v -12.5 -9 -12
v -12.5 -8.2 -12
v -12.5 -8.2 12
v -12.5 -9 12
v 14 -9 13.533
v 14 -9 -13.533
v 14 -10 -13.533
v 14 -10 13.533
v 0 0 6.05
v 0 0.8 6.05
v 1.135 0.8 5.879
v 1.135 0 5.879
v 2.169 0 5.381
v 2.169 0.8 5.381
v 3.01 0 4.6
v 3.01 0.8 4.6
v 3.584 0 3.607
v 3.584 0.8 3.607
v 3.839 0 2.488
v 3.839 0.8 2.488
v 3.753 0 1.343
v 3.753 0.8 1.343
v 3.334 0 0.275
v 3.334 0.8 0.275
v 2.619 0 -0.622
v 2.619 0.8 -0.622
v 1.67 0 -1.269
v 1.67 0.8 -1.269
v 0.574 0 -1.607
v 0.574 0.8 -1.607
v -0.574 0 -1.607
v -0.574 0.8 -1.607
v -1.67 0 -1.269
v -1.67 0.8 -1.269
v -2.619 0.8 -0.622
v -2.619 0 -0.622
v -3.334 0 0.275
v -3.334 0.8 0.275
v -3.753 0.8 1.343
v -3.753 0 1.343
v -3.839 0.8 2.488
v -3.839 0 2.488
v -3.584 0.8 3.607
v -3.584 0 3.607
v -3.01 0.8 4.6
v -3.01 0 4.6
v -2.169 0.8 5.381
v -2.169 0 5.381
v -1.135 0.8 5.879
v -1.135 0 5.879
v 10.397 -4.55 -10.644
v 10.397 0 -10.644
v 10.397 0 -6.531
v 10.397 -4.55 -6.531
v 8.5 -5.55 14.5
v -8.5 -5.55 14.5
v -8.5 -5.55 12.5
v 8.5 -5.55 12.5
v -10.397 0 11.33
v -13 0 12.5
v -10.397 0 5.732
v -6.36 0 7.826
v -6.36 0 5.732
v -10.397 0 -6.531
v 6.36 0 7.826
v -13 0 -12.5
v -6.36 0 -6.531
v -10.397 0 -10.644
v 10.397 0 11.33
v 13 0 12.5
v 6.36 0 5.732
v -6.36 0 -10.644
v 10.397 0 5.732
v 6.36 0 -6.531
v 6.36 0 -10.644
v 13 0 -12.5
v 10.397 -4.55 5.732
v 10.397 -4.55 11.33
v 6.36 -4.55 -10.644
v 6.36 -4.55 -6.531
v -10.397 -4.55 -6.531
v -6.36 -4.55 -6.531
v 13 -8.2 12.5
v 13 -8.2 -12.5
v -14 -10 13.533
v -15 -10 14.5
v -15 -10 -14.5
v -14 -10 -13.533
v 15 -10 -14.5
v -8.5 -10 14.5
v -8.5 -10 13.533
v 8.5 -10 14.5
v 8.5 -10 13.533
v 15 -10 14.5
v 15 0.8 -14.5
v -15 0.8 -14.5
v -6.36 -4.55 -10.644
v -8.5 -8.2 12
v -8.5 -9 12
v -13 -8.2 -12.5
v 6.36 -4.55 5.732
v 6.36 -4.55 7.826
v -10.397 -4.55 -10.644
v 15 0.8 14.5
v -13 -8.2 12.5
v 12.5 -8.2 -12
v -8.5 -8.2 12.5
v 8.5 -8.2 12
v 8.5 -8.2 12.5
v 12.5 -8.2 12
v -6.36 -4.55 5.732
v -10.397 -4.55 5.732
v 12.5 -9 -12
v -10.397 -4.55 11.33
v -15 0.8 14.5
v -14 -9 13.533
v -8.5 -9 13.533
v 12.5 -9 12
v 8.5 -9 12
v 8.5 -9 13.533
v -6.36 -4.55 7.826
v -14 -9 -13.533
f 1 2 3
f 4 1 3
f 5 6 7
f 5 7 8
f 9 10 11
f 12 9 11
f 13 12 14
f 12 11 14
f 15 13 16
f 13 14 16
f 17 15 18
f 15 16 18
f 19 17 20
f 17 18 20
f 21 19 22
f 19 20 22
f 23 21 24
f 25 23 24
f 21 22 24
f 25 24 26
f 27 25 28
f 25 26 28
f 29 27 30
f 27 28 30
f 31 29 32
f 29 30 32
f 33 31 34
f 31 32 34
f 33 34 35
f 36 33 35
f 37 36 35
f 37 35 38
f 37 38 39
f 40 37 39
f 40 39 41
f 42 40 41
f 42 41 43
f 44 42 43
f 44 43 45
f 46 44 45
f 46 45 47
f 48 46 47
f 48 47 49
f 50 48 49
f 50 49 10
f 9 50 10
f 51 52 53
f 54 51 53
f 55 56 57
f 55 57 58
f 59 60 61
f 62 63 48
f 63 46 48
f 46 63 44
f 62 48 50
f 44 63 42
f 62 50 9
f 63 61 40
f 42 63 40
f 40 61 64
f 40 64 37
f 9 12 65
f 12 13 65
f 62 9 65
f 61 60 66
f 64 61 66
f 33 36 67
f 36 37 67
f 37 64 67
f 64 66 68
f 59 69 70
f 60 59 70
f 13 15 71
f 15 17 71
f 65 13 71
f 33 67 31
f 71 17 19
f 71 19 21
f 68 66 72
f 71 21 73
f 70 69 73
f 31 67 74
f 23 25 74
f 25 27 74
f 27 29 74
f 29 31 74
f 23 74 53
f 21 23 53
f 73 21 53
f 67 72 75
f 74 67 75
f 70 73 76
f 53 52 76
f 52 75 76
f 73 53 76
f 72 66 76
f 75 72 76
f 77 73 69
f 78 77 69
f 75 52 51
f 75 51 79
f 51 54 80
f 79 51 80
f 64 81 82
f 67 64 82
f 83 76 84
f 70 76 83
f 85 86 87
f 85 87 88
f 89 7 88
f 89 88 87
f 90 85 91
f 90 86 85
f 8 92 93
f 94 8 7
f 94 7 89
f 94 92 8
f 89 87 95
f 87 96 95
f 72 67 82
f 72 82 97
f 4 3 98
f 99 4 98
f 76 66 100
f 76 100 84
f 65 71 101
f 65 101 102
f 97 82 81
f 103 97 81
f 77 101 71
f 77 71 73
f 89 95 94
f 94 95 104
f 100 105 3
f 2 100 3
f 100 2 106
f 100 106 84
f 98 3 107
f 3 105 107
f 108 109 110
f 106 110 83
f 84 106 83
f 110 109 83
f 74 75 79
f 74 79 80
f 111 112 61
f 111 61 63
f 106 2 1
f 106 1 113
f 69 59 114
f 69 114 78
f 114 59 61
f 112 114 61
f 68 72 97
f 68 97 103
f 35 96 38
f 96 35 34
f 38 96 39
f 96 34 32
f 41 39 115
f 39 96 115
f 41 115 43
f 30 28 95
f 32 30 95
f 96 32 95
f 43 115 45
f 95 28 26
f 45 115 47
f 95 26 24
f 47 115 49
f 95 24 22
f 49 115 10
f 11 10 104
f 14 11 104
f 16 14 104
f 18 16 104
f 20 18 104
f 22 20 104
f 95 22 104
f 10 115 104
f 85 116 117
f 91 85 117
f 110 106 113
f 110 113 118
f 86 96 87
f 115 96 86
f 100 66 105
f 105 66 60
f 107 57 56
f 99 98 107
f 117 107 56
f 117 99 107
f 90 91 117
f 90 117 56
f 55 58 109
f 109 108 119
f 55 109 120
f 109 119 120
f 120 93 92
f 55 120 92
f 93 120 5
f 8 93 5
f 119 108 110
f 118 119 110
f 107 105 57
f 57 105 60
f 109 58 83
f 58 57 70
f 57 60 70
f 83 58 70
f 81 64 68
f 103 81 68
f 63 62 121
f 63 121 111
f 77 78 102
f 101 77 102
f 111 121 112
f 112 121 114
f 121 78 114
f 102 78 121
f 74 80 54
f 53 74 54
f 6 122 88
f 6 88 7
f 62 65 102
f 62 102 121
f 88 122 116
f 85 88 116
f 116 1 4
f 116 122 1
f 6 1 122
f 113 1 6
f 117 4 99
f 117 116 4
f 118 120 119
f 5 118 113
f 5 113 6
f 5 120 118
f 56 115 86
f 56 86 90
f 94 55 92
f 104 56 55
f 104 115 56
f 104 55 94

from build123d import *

# Parameters (mm, degrees)
SKETCH2_W                = 26
SKETCH2_H                = 25
BOSS_EXTRUDE1_DEPTH      = 0.8
SKETCH3_R                = 3.85
CUT_EXTRUDE1_DEPTH       = 19.05242366
BOSS_EXTRUDE2_DEPTH      = 8.2
BOSS_EXTRUDE2_DEPTH_BACK = 0.8
SKETCH4_W                = 30
SKETCH4_H                = 29
SKETCH4_W_2              = 26
SKETCH4_H_2              = 25
SKETCH5_W                = 30
SKETCH5_H                = 29
SKETCH5_W_2              = 25
SKETCH5_H_2              = 24
BOSS_EXTRUDE3_DEPTH      = 0.8
SKETCH6_W                = 30
SKETCH6_H                = 29
SKETCH6_W_2              = 28
SKETCH6_H_2              = 27.066666666
BOSS_EXTRUDE4_DEPTH      = 1
BOSS_EXTRUDE5_DEPTH      = 4.55
SKETCH8_W                = 17
SKETCH8_H                = 3.928450078
CUT_EXTRUDE2_DEPTH       = 4.45
SKETCH9_W                = 4.03686976
SKETCH9_H                = 12.262943987
CUT_EXTRUDE3_DEPTH       = 4.55


with BuildPart() as part:
    # Sketch2 → Boss-Extrude1 (new body)
    with BuildSketch(Plane(origin=(0, 0, 0), x_dir=(1, 0, 0), z_dir=(0, 1, 0))):
        Rectangle(SKETCH2_W, SKETCH2_H)
    extrude(amount=BOSS_EXTRUDE1_DEPTH)

    # Sketch3 → Cut-Extrude1 (cut, through all)
    with BuildSketch(Plane(origin=(0, 0.8, 0), x_dir=(1, 0, 0), z_dir=(0, 1, 0))):
        with Locations(Location((0, -2.2, 0), (0, 0, 270))):
            Circle(SKETCH3_R)
    extrude(amount=-CUT_EXTRUDE1_DEPTH, mode=Mode.SUBTRACT)

    # Sketch4 → Boss-Extrude2 (add, two sides: drawn at the far end of the back side and taken through both)
    with BuildSketch(Plane.XZ.offset(-BOSS_EXTRUDE2_DEPTH_BACK)):
        Rectangle(SKETCH4_W, SKETCH4_H)
        Rectangle(SKETCH4_W_2, SKETCH4_H_2, mode=Mode.SUBTRACT)
    extrude(amount=BOSS_EXTRUDE2_DEPTH + BOSS_EXTRUDE2_DEPTH_BACK)

    # Sketch5 → Boss-Extrude3 (add)
    with BuildSketch(Plane.XZ.offset(8.2)):
        Rectangle(SKETCH5_W, SKETCH5_H)
        Rectangle(SKETCH5_W_2, SKETCH5_H_2, mode=Mode.SUBTRACT)
    extrude(amount=BOSS_EXTRUDE3_DEPTH)

    # Sketch6 → Boss-Extrude4 (add)
    with BuildSketch(Plane.XZ.offset(9)):
        Rectangle(SKETCH6_W, SKETCH6_H)
        Rectangle(SKETCH6_W_2, SKETCH6_H_2, mode=Mode.SUBTRACT)
    extrude(amount=BOSS_EXTRUDE4_DEPTH)

    # Sketch7 → Boss-Extrude5 (add)
    with BuildSketch(Plane.XZ):
        Polygon((-10.396843815, 11.329893901), (10.396843815, 11.329893901), (10.396843815, 7.826195619), (10.396843815, -10.644387716), (6.359974055, -10.644387716), (6.359974055, 7.826195619), (-6.359974055, 7.826195619), (-6.359974055, -10.644387716), (-10.396843815, -10.644387716), (-10.396843815, 7.826195619), align=None)
    extrude(amount=BOSS_EXTRUDE5_DEPTH)

    # Sketch8 → Cut-Extrude2 (cut)
    with BuildSketch(Plane.XZ.offset(10)):
        with Locations((0, 12.535774961)):
            Rectangle(SKETCH8_W, SKETCH8_H)
    extrude(amount=-CUT_EXTRUDE2_DEPTH, mode=Mode.SUBTRACT)

    # Sketch9 → Cut-Extrude3 (cut)
    with BuildSketch(Plane.XZ.offset(4.55)):
        with Locations((-8.378408935, -0.399878609)):
            Rectangle(SKETCH9_W, SKETCH9_H)
        with Locations((8.378408935, -0.399878609)):
            Rectangle(SKETCH9_W, SKETCH9_H)
    extrude(amount=-CUT_EXTRUDE3_DEPTH, mode=Mode.SUBTRACT)


solid = part.part
